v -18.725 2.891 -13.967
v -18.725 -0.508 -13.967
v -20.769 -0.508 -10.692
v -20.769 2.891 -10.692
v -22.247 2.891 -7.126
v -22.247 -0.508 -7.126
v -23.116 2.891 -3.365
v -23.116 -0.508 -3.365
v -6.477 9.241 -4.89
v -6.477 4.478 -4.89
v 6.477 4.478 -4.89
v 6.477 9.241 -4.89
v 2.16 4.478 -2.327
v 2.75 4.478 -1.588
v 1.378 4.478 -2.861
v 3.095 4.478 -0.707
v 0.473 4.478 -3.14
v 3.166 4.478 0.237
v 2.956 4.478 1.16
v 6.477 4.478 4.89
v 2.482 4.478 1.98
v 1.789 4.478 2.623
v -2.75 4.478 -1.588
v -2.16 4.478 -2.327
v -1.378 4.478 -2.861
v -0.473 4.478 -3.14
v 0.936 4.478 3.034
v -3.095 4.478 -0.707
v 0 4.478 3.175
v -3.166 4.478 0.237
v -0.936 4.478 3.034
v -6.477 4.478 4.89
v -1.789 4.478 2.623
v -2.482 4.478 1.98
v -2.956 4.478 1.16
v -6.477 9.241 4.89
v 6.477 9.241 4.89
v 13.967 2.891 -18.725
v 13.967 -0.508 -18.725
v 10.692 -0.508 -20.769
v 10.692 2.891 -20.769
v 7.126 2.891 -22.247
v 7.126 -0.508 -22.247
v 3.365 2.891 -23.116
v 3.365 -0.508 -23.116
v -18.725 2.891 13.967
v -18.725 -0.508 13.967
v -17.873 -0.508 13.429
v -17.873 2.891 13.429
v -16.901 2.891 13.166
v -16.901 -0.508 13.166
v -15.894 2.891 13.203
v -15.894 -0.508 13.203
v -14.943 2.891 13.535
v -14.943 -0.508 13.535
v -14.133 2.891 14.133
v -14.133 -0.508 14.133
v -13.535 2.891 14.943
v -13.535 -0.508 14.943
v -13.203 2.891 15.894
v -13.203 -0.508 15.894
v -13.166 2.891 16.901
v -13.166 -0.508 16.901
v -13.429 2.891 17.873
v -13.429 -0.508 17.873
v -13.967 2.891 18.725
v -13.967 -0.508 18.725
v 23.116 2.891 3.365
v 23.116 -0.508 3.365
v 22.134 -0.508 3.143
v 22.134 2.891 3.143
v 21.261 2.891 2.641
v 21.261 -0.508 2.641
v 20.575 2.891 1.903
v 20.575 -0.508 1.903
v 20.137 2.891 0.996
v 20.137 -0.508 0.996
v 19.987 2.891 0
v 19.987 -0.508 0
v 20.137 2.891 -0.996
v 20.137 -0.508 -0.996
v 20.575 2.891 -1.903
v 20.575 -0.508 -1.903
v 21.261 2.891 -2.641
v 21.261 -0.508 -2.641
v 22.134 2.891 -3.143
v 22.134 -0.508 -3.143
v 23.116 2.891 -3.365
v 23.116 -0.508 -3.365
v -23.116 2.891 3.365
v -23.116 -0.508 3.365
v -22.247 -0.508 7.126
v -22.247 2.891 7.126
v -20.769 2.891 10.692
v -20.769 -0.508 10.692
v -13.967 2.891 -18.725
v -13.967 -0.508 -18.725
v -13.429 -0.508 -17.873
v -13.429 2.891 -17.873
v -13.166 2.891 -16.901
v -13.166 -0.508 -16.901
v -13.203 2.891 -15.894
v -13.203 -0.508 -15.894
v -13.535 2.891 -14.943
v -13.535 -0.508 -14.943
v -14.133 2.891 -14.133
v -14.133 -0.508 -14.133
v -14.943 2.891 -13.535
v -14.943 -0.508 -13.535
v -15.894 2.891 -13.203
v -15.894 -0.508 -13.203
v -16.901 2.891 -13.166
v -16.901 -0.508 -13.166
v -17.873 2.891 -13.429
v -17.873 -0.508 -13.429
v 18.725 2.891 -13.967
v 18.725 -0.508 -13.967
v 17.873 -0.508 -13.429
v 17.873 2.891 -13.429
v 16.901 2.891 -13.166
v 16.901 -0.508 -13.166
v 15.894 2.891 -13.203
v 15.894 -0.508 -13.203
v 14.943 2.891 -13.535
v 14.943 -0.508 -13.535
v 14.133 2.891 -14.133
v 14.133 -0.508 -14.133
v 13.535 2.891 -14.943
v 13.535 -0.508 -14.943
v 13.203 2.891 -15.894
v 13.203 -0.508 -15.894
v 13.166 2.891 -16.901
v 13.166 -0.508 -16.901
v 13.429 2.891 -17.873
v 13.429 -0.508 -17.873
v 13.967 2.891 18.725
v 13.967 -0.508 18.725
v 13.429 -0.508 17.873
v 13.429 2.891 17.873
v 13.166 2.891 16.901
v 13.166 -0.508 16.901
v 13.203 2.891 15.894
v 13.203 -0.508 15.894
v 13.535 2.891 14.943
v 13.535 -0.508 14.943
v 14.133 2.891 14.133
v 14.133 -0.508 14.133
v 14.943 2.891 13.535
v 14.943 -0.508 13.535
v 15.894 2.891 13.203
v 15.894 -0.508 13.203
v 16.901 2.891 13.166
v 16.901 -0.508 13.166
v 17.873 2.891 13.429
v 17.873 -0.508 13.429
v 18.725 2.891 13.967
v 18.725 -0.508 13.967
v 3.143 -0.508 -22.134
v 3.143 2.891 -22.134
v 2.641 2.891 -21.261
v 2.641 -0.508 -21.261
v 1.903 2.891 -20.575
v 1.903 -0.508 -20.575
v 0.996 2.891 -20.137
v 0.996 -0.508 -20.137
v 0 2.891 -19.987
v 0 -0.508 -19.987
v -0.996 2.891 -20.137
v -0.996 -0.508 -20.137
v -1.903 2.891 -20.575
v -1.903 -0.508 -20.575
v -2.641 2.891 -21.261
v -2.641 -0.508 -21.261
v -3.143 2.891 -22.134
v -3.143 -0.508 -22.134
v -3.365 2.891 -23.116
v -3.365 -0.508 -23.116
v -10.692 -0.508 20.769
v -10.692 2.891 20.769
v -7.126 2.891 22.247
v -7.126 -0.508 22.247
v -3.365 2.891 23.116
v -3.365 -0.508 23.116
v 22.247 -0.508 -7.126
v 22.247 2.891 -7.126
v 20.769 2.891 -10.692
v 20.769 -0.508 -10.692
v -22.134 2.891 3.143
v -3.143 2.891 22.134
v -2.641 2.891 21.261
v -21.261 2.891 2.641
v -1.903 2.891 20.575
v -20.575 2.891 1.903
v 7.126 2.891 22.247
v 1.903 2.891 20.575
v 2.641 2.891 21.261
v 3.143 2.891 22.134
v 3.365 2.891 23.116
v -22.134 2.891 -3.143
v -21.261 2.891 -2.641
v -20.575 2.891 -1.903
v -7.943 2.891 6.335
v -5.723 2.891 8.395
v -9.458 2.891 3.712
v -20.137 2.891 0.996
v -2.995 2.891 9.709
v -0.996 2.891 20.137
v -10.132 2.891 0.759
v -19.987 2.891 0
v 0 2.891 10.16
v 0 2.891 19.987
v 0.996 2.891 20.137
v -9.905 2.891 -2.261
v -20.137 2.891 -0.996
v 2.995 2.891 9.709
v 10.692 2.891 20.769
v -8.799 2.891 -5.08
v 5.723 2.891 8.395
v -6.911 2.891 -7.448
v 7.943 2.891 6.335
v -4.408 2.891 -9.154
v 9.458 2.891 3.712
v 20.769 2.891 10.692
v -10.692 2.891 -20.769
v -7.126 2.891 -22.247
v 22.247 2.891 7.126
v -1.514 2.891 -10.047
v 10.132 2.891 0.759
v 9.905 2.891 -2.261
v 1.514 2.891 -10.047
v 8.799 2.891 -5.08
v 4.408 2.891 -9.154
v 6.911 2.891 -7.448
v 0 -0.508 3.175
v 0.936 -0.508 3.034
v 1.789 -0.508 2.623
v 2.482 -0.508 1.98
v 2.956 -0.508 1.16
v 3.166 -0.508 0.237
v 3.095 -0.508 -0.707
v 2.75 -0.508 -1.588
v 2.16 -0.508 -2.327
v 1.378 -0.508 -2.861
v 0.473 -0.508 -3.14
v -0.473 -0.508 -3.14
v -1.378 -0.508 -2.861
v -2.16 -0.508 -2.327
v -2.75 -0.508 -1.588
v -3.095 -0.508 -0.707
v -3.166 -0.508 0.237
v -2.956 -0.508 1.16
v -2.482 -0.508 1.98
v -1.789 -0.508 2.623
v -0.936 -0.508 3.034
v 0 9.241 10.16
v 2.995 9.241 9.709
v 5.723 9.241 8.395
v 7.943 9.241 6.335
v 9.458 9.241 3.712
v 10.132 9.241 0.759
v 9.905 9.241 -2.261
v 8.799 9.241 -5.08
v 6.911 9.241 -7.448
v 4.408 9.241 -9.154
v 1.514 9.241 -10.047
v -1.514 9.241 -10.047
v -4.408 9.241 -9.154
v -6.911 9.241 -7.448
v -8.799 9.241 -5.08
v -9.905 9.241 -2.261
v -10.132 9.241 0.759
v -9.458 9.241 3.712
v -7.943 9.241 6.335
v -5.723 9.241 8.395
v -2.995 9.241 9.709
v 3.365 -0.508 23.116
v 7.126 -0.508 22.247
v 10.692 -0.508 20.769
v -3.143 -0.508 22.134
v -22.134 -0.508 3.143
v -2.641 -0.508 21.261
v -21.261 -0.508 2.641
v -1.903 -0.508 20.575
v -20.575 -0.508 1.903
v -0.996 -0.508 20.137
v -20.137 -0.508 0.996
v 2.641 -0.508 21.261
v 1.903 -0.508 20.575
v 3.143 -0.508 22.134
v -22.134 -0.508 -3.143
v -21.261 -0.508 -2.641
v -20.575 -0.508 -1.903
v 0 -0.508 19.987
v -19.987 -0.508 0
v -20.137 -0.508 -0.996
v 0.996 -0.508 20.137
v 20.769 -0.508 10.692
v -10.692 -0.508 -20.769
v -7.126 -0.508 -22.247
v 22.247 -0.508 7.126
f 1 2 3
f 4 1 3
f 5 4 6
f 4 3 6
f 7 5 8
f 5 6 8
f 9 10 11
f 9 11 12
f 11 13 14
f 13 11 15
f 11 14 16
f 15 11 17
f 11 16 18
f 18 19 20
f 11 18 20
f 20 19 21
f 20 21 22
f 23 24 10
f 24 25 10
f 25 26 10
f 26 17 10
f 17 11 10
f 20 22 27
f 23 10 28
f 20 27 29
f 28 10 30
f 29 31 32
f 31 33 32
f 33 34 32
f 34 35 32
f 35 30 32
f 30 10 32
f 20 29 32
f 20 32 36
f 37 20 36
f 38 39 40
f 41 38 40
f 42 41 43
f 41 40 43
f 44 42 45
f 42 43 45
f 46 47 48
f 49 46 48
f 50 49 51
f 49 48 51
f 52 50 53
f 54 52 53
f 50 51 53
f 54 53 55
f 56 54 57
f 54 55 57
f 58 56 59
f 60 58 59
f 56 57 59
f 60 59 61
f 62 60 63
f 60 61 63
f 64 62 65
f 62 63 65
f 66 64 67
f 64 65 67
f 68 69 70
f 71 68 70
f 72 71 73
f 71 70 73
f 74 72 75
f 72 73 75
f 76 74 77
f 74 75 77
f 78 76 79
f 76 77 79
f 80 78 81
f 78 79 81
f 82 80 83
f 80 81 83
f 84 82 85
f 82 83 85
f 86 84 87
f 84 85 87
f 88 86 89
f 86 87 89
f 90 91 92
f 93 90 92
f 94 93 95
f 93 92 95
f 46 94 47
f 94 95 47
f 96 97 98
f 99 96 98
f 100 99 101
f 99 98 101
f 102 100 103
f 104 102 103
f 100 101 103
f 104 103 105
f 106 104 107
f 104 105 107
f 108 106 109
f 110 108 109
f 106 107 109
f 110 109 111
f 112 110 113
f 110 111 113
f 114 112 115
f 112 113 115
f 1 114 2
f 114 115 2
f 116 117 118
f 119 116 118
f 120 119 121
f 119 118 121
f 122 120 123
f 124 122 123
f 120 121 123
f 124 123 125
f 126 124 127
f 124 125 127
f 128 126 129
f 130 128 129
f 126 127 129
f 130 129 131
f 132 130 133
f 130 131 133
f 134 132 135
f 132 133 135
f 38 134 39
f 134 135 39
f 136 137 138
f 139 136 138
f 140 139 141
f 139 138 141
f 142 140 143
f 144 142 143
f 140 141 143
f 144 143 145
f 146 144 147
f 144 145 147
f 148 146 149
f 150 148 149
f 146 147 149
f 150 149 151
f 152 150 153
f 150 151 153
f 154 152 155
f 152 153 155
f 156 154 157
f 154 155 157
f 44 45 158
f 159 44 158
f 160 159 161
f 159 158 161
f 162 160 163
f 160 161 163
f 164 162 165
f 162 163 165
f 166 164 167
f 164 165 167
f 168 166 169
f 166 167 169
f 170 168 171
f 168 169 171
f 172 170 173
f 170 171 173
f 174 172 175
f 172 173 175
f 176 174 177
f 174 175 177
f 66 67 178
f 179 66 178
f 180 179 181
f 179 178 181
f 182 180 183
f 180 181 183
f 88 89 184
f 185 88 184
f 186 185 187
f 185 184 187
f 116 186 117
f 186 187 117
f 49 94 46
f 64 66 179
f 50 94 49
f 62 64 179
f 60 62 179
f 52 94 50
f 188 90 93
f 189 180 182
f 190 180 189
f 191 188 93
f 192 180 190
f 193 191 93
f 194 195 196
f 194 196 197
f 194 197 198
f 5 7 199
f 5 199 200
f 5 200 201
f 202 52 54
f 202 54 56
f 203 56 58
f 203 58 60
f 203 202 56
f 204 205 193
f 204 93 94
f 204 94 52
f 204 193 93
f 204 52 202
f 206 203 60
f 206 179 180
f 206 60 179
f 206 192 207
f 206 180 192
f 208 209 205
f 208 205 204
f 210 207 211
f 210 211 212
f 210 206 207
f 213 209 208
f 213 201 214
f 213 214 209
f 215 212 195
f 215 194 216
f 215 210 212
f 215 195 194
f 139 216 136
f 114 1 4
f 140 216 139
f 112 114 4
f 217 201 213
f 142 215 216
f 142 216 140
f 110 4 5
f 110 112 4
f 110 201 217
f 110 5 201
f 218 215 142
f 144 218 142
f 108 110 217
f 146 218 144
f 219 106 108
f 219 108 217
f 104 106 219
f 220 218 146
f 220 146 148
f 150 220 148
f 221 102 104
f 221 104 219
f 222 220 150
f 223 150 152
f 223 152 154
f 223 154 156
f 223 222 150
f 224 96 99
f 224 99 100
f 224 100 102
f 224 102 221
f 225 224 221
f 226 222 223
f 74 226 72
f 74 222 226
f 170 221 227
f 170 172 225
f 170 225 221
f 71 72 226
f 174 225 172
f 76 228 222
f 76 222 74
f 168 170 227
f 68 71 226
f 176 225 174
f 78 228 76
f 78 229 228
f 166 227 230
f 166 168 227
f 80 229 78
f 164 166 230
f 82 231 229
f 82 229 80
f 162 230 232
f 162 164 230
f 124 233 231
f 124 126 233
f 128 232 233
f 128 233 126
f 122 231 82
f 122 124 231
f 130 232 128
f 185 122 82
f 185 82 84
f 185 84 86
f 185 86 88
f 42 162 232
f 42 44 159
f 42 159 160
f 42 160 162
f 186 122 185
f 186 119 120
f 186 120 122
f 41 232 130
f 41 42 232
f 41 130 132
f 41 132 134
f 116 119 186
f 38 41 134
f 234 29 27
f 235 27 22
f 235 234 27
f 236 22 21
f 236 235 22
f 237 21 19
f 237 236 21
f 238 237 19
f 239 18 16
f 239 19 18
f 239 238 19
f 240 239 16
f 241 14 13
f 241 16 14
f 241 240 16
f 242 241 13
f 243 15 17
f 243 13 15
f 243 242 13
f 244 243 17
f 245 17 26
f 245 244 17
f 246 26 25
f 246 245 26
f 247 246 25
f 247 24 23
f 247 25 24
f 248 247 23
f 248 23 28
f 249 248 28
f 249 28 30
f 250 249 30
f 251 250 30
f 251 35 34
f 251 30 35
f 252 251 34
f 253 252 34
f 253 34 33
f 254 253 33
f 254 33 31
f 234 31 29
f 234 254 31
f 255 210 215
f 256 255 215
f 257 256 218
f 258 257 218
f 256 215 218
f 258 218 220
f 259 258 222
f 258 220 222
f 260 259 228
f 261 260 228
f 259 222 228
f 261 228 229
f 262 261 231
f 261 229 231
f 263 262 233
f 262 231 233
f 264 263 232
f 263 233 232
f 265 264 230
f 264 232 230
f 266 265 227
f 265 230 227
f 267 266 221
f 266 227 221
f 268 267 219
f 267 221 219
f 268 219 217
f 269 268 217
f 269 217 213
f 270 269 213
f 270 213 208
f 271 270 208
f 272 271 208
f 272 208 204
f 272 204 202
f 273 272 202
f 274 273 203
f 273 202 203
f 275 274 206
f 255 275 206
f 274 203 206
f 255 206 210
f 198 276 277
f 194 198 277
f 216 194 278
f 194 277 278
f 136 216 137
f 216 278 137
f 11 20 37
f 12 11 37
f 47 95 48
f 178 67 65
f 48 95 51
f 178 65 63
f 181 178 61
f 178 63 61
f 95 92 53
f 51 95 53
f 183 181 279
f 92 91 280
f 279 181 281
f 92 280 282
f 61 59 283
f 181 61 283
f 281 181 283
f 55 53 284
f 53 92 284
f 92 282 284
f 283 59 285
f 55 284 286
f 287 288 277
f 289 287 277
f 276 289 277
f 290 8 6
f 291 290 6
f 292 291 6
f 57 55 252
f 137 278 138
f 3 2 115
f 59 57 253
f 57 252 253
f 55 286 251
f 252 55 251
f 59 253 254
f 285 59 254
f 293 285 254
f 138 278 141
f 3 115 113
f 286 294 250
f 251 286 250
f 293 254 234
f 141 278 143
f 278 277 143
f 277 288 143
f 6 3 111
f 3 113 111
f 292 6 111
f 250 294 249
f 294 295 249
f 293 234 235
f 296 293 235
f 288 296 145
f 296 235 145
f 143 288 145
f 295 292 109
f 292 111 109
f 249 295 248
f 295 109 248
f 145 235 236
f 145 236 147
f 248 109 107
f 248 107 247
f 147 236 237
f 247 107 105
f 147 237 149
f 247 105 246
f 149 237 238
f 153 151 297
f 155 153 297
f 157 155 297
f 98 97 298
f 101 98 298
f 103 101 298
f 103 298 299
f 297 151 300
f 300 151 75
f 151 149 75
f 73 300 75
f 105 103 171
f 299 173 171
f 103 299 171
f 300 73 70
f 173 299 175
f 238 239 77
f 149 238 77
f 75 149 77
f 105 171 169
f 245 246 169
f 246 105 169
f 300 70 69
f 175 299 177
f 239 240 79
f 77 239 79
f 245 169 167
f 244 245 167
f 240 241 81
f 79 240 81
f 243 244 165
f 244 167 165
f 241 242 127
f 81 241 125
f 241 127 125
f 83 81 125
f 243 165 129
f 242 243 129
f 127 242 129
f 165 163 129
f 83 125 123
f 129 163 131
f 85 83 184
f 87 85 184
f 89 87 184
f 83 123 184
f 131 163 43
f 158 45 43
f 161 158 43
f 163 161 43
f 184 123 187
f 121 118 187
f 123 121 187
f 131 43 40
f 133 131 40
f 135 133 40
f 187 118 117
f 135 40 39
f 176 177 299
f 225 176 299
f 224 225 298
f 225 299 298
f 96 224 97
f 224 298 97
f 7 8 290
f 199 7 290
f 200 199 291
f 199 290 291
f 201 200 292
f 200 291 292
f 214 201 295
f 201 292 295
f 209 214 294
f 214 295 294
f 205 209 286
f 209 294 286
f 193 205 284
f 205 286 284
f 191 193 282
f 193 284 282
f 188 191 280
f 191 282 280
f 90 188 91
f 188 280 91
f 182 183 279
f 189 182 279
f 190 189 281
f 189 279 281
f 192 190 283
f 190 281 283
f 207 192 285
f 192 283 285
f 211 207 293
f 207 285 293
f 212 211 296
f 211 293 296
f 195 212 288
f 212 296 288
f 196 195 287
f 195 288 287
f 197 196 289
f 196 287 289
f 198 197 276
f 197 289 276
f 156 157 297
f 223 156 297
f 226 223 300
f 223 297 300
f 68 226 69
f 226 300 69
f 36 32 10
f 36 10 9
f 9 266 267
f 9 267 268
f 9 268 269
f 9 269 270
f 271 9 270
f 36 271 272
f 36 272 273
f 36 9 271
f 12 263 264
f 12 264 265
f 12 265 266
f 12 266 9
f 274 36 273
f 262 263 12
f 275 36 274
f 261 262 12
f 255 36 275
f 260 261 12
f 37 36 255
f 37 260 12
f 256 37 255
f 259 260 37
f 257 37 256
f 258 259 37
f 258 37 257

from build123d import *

# Parameters (mm, degrees)
EXTRUDE1_DEPTH      = 2.89052
EXTRUDE1_DEPTH_BACK = 0.508
SKETCH5_R           = 10.16
EXTRUDE2_DEPTH      = 6.35
CUT_EXTRUDE1_START  = -0.508
SKETCH3_R           = 3.175
CUT_EXTRUDE1_DEPTH  = 9.74852
SPLIT1_START        = -6.477
SPLIT1_OUTLINE_W    = 4.7625
SPLIT1_OUTLINE_H    = 9.779
SPLIT1_DEPTH        = 12.954


# Read off the part's stored shape, not the designer's step: Split1
with BuildPart() as part:
    # Sketch1 → Extrude1 (new, two sides: drawn at the far end of the back side and taken through both)
    with BuildSketch(Plane(origin=(0, 0, 0), x_dir=(1, 0, 0), z_dir=(0, 1, 0)).offset(-EXTRUDE1_DEPTH_BACK)):
        with BuildLine():
            ThreePointArc((-3.364632139, 23.11648266), (-8.939508898, 21.581883622), (-13.966667445, 18.724975848))
            ThreePointArc((-13.966667445, 18.724975848), (-14.132678071, 14.132678071), (-18.724975848, 13.966667445))
            ThreePointArc((-18.724975848, 13.966667445), (-21.581883622, 8.939508898), (-23.11648266, 3.364632139))
            ThreePointArc((-23.11648266, 3.364632139), (-19.986625, 0), (-23.11648266, -3.364632139))
            ThreePointArc((-23.11648266, -3.364632139), (-21.581883622, -8.939508898), (-18.724975848, -13.966667445))
            ThreePointArc((-18.724975848, -13.966667445), (-14.132678071, -14.132678071), (-13.966667445, -18.724975848))
            ThreePointArc((-13.966667445, -18.724975848), (-8.939508898, -21.581883622), (-3.364632139, -23.11648266))
            ThreePointArc((-3.364632139, -23.11648266), (0, -19.986625), (3.364632139, -23.11648266))
            ThreePointArc((3.364632139, -23.11648266), (8.939508898, -21.581883622), (13.966667445, -18.724975848))
            ThreePointArc((13.966667445, -18.724975848), (14.132678071, -14.132678071), (18.724975848, -13.966667445))
            ThreePointArc((18.724975848, -13.966667445), (21.581883622, -8.939508898), (23.11648266, -3.364632139))
            ThreePointArc((23.11648266, -3.364632139), (19.986625, 0), (23.11648266, 3.364632139))
            ThreePointArc((23.11648266, 3.364632139), (21.581883622, 8.939508898), (18.724975848, 13.966667445))
            ThreePointArc((18.724975848, 13.966667445), (14.132678071, 14.132678071), (13.966667445, 18.724975848))
            ThreePointArc((13.966667445, 18.724975848), (8.939508898, 21.581883622), (3.364632139, 23.11648266))
            ThreePointArc((3.364632139, 23.11648266), (0, 19.986625), (-3.364632139, 23.11648266))
        make_face()
    extrude(amount=EXTRUDE1_DEPTH + EXTRUDE1_DEPTH_BACK)

    # Sketch5 → Extrude2 (add)
    with BuildSketch(Plane(origin=(0, 2.89052, 0), x_dir=(-1, 0, 0), z_dir=(0, 1, 0))):
        with Locations(Location((0, 0, 0), (0, 0, 90))):
            Circle(SKETCH5_R)
    extrude(amount=EXTRUDE2_DEPTH)

    # Sketch3 → Cut-Extrude1 (cut)
    with BuildSketch(Plane(origin=(0, 0, 0), x_dir=(1, 0, 0), z_dir=(0, 1, 0)).offset(CUT_EXTRUDE1_START)):
        with Locations(Location((0, 0, 0), (0, 0, 270))):
            Circle(SKETCH3_R)
    extrude(amount=CUT_EXTRUDE1_DEPTH, mode=Mode.SUBTRACT)

    # Split1 outline → Split1 (cut)
    with BuildSketch(Plane.YZ.offset(SPLIT1_START)):
        with Locations((6.85927, 0)):
            Rectangle(SPLIT1_OUTLINE_W, SPLIT1_OUTLINE_H)
    extrude(amount=SPLIT1_DEPTH, mode=Mode.SUBTRACT)


solid = part.part
